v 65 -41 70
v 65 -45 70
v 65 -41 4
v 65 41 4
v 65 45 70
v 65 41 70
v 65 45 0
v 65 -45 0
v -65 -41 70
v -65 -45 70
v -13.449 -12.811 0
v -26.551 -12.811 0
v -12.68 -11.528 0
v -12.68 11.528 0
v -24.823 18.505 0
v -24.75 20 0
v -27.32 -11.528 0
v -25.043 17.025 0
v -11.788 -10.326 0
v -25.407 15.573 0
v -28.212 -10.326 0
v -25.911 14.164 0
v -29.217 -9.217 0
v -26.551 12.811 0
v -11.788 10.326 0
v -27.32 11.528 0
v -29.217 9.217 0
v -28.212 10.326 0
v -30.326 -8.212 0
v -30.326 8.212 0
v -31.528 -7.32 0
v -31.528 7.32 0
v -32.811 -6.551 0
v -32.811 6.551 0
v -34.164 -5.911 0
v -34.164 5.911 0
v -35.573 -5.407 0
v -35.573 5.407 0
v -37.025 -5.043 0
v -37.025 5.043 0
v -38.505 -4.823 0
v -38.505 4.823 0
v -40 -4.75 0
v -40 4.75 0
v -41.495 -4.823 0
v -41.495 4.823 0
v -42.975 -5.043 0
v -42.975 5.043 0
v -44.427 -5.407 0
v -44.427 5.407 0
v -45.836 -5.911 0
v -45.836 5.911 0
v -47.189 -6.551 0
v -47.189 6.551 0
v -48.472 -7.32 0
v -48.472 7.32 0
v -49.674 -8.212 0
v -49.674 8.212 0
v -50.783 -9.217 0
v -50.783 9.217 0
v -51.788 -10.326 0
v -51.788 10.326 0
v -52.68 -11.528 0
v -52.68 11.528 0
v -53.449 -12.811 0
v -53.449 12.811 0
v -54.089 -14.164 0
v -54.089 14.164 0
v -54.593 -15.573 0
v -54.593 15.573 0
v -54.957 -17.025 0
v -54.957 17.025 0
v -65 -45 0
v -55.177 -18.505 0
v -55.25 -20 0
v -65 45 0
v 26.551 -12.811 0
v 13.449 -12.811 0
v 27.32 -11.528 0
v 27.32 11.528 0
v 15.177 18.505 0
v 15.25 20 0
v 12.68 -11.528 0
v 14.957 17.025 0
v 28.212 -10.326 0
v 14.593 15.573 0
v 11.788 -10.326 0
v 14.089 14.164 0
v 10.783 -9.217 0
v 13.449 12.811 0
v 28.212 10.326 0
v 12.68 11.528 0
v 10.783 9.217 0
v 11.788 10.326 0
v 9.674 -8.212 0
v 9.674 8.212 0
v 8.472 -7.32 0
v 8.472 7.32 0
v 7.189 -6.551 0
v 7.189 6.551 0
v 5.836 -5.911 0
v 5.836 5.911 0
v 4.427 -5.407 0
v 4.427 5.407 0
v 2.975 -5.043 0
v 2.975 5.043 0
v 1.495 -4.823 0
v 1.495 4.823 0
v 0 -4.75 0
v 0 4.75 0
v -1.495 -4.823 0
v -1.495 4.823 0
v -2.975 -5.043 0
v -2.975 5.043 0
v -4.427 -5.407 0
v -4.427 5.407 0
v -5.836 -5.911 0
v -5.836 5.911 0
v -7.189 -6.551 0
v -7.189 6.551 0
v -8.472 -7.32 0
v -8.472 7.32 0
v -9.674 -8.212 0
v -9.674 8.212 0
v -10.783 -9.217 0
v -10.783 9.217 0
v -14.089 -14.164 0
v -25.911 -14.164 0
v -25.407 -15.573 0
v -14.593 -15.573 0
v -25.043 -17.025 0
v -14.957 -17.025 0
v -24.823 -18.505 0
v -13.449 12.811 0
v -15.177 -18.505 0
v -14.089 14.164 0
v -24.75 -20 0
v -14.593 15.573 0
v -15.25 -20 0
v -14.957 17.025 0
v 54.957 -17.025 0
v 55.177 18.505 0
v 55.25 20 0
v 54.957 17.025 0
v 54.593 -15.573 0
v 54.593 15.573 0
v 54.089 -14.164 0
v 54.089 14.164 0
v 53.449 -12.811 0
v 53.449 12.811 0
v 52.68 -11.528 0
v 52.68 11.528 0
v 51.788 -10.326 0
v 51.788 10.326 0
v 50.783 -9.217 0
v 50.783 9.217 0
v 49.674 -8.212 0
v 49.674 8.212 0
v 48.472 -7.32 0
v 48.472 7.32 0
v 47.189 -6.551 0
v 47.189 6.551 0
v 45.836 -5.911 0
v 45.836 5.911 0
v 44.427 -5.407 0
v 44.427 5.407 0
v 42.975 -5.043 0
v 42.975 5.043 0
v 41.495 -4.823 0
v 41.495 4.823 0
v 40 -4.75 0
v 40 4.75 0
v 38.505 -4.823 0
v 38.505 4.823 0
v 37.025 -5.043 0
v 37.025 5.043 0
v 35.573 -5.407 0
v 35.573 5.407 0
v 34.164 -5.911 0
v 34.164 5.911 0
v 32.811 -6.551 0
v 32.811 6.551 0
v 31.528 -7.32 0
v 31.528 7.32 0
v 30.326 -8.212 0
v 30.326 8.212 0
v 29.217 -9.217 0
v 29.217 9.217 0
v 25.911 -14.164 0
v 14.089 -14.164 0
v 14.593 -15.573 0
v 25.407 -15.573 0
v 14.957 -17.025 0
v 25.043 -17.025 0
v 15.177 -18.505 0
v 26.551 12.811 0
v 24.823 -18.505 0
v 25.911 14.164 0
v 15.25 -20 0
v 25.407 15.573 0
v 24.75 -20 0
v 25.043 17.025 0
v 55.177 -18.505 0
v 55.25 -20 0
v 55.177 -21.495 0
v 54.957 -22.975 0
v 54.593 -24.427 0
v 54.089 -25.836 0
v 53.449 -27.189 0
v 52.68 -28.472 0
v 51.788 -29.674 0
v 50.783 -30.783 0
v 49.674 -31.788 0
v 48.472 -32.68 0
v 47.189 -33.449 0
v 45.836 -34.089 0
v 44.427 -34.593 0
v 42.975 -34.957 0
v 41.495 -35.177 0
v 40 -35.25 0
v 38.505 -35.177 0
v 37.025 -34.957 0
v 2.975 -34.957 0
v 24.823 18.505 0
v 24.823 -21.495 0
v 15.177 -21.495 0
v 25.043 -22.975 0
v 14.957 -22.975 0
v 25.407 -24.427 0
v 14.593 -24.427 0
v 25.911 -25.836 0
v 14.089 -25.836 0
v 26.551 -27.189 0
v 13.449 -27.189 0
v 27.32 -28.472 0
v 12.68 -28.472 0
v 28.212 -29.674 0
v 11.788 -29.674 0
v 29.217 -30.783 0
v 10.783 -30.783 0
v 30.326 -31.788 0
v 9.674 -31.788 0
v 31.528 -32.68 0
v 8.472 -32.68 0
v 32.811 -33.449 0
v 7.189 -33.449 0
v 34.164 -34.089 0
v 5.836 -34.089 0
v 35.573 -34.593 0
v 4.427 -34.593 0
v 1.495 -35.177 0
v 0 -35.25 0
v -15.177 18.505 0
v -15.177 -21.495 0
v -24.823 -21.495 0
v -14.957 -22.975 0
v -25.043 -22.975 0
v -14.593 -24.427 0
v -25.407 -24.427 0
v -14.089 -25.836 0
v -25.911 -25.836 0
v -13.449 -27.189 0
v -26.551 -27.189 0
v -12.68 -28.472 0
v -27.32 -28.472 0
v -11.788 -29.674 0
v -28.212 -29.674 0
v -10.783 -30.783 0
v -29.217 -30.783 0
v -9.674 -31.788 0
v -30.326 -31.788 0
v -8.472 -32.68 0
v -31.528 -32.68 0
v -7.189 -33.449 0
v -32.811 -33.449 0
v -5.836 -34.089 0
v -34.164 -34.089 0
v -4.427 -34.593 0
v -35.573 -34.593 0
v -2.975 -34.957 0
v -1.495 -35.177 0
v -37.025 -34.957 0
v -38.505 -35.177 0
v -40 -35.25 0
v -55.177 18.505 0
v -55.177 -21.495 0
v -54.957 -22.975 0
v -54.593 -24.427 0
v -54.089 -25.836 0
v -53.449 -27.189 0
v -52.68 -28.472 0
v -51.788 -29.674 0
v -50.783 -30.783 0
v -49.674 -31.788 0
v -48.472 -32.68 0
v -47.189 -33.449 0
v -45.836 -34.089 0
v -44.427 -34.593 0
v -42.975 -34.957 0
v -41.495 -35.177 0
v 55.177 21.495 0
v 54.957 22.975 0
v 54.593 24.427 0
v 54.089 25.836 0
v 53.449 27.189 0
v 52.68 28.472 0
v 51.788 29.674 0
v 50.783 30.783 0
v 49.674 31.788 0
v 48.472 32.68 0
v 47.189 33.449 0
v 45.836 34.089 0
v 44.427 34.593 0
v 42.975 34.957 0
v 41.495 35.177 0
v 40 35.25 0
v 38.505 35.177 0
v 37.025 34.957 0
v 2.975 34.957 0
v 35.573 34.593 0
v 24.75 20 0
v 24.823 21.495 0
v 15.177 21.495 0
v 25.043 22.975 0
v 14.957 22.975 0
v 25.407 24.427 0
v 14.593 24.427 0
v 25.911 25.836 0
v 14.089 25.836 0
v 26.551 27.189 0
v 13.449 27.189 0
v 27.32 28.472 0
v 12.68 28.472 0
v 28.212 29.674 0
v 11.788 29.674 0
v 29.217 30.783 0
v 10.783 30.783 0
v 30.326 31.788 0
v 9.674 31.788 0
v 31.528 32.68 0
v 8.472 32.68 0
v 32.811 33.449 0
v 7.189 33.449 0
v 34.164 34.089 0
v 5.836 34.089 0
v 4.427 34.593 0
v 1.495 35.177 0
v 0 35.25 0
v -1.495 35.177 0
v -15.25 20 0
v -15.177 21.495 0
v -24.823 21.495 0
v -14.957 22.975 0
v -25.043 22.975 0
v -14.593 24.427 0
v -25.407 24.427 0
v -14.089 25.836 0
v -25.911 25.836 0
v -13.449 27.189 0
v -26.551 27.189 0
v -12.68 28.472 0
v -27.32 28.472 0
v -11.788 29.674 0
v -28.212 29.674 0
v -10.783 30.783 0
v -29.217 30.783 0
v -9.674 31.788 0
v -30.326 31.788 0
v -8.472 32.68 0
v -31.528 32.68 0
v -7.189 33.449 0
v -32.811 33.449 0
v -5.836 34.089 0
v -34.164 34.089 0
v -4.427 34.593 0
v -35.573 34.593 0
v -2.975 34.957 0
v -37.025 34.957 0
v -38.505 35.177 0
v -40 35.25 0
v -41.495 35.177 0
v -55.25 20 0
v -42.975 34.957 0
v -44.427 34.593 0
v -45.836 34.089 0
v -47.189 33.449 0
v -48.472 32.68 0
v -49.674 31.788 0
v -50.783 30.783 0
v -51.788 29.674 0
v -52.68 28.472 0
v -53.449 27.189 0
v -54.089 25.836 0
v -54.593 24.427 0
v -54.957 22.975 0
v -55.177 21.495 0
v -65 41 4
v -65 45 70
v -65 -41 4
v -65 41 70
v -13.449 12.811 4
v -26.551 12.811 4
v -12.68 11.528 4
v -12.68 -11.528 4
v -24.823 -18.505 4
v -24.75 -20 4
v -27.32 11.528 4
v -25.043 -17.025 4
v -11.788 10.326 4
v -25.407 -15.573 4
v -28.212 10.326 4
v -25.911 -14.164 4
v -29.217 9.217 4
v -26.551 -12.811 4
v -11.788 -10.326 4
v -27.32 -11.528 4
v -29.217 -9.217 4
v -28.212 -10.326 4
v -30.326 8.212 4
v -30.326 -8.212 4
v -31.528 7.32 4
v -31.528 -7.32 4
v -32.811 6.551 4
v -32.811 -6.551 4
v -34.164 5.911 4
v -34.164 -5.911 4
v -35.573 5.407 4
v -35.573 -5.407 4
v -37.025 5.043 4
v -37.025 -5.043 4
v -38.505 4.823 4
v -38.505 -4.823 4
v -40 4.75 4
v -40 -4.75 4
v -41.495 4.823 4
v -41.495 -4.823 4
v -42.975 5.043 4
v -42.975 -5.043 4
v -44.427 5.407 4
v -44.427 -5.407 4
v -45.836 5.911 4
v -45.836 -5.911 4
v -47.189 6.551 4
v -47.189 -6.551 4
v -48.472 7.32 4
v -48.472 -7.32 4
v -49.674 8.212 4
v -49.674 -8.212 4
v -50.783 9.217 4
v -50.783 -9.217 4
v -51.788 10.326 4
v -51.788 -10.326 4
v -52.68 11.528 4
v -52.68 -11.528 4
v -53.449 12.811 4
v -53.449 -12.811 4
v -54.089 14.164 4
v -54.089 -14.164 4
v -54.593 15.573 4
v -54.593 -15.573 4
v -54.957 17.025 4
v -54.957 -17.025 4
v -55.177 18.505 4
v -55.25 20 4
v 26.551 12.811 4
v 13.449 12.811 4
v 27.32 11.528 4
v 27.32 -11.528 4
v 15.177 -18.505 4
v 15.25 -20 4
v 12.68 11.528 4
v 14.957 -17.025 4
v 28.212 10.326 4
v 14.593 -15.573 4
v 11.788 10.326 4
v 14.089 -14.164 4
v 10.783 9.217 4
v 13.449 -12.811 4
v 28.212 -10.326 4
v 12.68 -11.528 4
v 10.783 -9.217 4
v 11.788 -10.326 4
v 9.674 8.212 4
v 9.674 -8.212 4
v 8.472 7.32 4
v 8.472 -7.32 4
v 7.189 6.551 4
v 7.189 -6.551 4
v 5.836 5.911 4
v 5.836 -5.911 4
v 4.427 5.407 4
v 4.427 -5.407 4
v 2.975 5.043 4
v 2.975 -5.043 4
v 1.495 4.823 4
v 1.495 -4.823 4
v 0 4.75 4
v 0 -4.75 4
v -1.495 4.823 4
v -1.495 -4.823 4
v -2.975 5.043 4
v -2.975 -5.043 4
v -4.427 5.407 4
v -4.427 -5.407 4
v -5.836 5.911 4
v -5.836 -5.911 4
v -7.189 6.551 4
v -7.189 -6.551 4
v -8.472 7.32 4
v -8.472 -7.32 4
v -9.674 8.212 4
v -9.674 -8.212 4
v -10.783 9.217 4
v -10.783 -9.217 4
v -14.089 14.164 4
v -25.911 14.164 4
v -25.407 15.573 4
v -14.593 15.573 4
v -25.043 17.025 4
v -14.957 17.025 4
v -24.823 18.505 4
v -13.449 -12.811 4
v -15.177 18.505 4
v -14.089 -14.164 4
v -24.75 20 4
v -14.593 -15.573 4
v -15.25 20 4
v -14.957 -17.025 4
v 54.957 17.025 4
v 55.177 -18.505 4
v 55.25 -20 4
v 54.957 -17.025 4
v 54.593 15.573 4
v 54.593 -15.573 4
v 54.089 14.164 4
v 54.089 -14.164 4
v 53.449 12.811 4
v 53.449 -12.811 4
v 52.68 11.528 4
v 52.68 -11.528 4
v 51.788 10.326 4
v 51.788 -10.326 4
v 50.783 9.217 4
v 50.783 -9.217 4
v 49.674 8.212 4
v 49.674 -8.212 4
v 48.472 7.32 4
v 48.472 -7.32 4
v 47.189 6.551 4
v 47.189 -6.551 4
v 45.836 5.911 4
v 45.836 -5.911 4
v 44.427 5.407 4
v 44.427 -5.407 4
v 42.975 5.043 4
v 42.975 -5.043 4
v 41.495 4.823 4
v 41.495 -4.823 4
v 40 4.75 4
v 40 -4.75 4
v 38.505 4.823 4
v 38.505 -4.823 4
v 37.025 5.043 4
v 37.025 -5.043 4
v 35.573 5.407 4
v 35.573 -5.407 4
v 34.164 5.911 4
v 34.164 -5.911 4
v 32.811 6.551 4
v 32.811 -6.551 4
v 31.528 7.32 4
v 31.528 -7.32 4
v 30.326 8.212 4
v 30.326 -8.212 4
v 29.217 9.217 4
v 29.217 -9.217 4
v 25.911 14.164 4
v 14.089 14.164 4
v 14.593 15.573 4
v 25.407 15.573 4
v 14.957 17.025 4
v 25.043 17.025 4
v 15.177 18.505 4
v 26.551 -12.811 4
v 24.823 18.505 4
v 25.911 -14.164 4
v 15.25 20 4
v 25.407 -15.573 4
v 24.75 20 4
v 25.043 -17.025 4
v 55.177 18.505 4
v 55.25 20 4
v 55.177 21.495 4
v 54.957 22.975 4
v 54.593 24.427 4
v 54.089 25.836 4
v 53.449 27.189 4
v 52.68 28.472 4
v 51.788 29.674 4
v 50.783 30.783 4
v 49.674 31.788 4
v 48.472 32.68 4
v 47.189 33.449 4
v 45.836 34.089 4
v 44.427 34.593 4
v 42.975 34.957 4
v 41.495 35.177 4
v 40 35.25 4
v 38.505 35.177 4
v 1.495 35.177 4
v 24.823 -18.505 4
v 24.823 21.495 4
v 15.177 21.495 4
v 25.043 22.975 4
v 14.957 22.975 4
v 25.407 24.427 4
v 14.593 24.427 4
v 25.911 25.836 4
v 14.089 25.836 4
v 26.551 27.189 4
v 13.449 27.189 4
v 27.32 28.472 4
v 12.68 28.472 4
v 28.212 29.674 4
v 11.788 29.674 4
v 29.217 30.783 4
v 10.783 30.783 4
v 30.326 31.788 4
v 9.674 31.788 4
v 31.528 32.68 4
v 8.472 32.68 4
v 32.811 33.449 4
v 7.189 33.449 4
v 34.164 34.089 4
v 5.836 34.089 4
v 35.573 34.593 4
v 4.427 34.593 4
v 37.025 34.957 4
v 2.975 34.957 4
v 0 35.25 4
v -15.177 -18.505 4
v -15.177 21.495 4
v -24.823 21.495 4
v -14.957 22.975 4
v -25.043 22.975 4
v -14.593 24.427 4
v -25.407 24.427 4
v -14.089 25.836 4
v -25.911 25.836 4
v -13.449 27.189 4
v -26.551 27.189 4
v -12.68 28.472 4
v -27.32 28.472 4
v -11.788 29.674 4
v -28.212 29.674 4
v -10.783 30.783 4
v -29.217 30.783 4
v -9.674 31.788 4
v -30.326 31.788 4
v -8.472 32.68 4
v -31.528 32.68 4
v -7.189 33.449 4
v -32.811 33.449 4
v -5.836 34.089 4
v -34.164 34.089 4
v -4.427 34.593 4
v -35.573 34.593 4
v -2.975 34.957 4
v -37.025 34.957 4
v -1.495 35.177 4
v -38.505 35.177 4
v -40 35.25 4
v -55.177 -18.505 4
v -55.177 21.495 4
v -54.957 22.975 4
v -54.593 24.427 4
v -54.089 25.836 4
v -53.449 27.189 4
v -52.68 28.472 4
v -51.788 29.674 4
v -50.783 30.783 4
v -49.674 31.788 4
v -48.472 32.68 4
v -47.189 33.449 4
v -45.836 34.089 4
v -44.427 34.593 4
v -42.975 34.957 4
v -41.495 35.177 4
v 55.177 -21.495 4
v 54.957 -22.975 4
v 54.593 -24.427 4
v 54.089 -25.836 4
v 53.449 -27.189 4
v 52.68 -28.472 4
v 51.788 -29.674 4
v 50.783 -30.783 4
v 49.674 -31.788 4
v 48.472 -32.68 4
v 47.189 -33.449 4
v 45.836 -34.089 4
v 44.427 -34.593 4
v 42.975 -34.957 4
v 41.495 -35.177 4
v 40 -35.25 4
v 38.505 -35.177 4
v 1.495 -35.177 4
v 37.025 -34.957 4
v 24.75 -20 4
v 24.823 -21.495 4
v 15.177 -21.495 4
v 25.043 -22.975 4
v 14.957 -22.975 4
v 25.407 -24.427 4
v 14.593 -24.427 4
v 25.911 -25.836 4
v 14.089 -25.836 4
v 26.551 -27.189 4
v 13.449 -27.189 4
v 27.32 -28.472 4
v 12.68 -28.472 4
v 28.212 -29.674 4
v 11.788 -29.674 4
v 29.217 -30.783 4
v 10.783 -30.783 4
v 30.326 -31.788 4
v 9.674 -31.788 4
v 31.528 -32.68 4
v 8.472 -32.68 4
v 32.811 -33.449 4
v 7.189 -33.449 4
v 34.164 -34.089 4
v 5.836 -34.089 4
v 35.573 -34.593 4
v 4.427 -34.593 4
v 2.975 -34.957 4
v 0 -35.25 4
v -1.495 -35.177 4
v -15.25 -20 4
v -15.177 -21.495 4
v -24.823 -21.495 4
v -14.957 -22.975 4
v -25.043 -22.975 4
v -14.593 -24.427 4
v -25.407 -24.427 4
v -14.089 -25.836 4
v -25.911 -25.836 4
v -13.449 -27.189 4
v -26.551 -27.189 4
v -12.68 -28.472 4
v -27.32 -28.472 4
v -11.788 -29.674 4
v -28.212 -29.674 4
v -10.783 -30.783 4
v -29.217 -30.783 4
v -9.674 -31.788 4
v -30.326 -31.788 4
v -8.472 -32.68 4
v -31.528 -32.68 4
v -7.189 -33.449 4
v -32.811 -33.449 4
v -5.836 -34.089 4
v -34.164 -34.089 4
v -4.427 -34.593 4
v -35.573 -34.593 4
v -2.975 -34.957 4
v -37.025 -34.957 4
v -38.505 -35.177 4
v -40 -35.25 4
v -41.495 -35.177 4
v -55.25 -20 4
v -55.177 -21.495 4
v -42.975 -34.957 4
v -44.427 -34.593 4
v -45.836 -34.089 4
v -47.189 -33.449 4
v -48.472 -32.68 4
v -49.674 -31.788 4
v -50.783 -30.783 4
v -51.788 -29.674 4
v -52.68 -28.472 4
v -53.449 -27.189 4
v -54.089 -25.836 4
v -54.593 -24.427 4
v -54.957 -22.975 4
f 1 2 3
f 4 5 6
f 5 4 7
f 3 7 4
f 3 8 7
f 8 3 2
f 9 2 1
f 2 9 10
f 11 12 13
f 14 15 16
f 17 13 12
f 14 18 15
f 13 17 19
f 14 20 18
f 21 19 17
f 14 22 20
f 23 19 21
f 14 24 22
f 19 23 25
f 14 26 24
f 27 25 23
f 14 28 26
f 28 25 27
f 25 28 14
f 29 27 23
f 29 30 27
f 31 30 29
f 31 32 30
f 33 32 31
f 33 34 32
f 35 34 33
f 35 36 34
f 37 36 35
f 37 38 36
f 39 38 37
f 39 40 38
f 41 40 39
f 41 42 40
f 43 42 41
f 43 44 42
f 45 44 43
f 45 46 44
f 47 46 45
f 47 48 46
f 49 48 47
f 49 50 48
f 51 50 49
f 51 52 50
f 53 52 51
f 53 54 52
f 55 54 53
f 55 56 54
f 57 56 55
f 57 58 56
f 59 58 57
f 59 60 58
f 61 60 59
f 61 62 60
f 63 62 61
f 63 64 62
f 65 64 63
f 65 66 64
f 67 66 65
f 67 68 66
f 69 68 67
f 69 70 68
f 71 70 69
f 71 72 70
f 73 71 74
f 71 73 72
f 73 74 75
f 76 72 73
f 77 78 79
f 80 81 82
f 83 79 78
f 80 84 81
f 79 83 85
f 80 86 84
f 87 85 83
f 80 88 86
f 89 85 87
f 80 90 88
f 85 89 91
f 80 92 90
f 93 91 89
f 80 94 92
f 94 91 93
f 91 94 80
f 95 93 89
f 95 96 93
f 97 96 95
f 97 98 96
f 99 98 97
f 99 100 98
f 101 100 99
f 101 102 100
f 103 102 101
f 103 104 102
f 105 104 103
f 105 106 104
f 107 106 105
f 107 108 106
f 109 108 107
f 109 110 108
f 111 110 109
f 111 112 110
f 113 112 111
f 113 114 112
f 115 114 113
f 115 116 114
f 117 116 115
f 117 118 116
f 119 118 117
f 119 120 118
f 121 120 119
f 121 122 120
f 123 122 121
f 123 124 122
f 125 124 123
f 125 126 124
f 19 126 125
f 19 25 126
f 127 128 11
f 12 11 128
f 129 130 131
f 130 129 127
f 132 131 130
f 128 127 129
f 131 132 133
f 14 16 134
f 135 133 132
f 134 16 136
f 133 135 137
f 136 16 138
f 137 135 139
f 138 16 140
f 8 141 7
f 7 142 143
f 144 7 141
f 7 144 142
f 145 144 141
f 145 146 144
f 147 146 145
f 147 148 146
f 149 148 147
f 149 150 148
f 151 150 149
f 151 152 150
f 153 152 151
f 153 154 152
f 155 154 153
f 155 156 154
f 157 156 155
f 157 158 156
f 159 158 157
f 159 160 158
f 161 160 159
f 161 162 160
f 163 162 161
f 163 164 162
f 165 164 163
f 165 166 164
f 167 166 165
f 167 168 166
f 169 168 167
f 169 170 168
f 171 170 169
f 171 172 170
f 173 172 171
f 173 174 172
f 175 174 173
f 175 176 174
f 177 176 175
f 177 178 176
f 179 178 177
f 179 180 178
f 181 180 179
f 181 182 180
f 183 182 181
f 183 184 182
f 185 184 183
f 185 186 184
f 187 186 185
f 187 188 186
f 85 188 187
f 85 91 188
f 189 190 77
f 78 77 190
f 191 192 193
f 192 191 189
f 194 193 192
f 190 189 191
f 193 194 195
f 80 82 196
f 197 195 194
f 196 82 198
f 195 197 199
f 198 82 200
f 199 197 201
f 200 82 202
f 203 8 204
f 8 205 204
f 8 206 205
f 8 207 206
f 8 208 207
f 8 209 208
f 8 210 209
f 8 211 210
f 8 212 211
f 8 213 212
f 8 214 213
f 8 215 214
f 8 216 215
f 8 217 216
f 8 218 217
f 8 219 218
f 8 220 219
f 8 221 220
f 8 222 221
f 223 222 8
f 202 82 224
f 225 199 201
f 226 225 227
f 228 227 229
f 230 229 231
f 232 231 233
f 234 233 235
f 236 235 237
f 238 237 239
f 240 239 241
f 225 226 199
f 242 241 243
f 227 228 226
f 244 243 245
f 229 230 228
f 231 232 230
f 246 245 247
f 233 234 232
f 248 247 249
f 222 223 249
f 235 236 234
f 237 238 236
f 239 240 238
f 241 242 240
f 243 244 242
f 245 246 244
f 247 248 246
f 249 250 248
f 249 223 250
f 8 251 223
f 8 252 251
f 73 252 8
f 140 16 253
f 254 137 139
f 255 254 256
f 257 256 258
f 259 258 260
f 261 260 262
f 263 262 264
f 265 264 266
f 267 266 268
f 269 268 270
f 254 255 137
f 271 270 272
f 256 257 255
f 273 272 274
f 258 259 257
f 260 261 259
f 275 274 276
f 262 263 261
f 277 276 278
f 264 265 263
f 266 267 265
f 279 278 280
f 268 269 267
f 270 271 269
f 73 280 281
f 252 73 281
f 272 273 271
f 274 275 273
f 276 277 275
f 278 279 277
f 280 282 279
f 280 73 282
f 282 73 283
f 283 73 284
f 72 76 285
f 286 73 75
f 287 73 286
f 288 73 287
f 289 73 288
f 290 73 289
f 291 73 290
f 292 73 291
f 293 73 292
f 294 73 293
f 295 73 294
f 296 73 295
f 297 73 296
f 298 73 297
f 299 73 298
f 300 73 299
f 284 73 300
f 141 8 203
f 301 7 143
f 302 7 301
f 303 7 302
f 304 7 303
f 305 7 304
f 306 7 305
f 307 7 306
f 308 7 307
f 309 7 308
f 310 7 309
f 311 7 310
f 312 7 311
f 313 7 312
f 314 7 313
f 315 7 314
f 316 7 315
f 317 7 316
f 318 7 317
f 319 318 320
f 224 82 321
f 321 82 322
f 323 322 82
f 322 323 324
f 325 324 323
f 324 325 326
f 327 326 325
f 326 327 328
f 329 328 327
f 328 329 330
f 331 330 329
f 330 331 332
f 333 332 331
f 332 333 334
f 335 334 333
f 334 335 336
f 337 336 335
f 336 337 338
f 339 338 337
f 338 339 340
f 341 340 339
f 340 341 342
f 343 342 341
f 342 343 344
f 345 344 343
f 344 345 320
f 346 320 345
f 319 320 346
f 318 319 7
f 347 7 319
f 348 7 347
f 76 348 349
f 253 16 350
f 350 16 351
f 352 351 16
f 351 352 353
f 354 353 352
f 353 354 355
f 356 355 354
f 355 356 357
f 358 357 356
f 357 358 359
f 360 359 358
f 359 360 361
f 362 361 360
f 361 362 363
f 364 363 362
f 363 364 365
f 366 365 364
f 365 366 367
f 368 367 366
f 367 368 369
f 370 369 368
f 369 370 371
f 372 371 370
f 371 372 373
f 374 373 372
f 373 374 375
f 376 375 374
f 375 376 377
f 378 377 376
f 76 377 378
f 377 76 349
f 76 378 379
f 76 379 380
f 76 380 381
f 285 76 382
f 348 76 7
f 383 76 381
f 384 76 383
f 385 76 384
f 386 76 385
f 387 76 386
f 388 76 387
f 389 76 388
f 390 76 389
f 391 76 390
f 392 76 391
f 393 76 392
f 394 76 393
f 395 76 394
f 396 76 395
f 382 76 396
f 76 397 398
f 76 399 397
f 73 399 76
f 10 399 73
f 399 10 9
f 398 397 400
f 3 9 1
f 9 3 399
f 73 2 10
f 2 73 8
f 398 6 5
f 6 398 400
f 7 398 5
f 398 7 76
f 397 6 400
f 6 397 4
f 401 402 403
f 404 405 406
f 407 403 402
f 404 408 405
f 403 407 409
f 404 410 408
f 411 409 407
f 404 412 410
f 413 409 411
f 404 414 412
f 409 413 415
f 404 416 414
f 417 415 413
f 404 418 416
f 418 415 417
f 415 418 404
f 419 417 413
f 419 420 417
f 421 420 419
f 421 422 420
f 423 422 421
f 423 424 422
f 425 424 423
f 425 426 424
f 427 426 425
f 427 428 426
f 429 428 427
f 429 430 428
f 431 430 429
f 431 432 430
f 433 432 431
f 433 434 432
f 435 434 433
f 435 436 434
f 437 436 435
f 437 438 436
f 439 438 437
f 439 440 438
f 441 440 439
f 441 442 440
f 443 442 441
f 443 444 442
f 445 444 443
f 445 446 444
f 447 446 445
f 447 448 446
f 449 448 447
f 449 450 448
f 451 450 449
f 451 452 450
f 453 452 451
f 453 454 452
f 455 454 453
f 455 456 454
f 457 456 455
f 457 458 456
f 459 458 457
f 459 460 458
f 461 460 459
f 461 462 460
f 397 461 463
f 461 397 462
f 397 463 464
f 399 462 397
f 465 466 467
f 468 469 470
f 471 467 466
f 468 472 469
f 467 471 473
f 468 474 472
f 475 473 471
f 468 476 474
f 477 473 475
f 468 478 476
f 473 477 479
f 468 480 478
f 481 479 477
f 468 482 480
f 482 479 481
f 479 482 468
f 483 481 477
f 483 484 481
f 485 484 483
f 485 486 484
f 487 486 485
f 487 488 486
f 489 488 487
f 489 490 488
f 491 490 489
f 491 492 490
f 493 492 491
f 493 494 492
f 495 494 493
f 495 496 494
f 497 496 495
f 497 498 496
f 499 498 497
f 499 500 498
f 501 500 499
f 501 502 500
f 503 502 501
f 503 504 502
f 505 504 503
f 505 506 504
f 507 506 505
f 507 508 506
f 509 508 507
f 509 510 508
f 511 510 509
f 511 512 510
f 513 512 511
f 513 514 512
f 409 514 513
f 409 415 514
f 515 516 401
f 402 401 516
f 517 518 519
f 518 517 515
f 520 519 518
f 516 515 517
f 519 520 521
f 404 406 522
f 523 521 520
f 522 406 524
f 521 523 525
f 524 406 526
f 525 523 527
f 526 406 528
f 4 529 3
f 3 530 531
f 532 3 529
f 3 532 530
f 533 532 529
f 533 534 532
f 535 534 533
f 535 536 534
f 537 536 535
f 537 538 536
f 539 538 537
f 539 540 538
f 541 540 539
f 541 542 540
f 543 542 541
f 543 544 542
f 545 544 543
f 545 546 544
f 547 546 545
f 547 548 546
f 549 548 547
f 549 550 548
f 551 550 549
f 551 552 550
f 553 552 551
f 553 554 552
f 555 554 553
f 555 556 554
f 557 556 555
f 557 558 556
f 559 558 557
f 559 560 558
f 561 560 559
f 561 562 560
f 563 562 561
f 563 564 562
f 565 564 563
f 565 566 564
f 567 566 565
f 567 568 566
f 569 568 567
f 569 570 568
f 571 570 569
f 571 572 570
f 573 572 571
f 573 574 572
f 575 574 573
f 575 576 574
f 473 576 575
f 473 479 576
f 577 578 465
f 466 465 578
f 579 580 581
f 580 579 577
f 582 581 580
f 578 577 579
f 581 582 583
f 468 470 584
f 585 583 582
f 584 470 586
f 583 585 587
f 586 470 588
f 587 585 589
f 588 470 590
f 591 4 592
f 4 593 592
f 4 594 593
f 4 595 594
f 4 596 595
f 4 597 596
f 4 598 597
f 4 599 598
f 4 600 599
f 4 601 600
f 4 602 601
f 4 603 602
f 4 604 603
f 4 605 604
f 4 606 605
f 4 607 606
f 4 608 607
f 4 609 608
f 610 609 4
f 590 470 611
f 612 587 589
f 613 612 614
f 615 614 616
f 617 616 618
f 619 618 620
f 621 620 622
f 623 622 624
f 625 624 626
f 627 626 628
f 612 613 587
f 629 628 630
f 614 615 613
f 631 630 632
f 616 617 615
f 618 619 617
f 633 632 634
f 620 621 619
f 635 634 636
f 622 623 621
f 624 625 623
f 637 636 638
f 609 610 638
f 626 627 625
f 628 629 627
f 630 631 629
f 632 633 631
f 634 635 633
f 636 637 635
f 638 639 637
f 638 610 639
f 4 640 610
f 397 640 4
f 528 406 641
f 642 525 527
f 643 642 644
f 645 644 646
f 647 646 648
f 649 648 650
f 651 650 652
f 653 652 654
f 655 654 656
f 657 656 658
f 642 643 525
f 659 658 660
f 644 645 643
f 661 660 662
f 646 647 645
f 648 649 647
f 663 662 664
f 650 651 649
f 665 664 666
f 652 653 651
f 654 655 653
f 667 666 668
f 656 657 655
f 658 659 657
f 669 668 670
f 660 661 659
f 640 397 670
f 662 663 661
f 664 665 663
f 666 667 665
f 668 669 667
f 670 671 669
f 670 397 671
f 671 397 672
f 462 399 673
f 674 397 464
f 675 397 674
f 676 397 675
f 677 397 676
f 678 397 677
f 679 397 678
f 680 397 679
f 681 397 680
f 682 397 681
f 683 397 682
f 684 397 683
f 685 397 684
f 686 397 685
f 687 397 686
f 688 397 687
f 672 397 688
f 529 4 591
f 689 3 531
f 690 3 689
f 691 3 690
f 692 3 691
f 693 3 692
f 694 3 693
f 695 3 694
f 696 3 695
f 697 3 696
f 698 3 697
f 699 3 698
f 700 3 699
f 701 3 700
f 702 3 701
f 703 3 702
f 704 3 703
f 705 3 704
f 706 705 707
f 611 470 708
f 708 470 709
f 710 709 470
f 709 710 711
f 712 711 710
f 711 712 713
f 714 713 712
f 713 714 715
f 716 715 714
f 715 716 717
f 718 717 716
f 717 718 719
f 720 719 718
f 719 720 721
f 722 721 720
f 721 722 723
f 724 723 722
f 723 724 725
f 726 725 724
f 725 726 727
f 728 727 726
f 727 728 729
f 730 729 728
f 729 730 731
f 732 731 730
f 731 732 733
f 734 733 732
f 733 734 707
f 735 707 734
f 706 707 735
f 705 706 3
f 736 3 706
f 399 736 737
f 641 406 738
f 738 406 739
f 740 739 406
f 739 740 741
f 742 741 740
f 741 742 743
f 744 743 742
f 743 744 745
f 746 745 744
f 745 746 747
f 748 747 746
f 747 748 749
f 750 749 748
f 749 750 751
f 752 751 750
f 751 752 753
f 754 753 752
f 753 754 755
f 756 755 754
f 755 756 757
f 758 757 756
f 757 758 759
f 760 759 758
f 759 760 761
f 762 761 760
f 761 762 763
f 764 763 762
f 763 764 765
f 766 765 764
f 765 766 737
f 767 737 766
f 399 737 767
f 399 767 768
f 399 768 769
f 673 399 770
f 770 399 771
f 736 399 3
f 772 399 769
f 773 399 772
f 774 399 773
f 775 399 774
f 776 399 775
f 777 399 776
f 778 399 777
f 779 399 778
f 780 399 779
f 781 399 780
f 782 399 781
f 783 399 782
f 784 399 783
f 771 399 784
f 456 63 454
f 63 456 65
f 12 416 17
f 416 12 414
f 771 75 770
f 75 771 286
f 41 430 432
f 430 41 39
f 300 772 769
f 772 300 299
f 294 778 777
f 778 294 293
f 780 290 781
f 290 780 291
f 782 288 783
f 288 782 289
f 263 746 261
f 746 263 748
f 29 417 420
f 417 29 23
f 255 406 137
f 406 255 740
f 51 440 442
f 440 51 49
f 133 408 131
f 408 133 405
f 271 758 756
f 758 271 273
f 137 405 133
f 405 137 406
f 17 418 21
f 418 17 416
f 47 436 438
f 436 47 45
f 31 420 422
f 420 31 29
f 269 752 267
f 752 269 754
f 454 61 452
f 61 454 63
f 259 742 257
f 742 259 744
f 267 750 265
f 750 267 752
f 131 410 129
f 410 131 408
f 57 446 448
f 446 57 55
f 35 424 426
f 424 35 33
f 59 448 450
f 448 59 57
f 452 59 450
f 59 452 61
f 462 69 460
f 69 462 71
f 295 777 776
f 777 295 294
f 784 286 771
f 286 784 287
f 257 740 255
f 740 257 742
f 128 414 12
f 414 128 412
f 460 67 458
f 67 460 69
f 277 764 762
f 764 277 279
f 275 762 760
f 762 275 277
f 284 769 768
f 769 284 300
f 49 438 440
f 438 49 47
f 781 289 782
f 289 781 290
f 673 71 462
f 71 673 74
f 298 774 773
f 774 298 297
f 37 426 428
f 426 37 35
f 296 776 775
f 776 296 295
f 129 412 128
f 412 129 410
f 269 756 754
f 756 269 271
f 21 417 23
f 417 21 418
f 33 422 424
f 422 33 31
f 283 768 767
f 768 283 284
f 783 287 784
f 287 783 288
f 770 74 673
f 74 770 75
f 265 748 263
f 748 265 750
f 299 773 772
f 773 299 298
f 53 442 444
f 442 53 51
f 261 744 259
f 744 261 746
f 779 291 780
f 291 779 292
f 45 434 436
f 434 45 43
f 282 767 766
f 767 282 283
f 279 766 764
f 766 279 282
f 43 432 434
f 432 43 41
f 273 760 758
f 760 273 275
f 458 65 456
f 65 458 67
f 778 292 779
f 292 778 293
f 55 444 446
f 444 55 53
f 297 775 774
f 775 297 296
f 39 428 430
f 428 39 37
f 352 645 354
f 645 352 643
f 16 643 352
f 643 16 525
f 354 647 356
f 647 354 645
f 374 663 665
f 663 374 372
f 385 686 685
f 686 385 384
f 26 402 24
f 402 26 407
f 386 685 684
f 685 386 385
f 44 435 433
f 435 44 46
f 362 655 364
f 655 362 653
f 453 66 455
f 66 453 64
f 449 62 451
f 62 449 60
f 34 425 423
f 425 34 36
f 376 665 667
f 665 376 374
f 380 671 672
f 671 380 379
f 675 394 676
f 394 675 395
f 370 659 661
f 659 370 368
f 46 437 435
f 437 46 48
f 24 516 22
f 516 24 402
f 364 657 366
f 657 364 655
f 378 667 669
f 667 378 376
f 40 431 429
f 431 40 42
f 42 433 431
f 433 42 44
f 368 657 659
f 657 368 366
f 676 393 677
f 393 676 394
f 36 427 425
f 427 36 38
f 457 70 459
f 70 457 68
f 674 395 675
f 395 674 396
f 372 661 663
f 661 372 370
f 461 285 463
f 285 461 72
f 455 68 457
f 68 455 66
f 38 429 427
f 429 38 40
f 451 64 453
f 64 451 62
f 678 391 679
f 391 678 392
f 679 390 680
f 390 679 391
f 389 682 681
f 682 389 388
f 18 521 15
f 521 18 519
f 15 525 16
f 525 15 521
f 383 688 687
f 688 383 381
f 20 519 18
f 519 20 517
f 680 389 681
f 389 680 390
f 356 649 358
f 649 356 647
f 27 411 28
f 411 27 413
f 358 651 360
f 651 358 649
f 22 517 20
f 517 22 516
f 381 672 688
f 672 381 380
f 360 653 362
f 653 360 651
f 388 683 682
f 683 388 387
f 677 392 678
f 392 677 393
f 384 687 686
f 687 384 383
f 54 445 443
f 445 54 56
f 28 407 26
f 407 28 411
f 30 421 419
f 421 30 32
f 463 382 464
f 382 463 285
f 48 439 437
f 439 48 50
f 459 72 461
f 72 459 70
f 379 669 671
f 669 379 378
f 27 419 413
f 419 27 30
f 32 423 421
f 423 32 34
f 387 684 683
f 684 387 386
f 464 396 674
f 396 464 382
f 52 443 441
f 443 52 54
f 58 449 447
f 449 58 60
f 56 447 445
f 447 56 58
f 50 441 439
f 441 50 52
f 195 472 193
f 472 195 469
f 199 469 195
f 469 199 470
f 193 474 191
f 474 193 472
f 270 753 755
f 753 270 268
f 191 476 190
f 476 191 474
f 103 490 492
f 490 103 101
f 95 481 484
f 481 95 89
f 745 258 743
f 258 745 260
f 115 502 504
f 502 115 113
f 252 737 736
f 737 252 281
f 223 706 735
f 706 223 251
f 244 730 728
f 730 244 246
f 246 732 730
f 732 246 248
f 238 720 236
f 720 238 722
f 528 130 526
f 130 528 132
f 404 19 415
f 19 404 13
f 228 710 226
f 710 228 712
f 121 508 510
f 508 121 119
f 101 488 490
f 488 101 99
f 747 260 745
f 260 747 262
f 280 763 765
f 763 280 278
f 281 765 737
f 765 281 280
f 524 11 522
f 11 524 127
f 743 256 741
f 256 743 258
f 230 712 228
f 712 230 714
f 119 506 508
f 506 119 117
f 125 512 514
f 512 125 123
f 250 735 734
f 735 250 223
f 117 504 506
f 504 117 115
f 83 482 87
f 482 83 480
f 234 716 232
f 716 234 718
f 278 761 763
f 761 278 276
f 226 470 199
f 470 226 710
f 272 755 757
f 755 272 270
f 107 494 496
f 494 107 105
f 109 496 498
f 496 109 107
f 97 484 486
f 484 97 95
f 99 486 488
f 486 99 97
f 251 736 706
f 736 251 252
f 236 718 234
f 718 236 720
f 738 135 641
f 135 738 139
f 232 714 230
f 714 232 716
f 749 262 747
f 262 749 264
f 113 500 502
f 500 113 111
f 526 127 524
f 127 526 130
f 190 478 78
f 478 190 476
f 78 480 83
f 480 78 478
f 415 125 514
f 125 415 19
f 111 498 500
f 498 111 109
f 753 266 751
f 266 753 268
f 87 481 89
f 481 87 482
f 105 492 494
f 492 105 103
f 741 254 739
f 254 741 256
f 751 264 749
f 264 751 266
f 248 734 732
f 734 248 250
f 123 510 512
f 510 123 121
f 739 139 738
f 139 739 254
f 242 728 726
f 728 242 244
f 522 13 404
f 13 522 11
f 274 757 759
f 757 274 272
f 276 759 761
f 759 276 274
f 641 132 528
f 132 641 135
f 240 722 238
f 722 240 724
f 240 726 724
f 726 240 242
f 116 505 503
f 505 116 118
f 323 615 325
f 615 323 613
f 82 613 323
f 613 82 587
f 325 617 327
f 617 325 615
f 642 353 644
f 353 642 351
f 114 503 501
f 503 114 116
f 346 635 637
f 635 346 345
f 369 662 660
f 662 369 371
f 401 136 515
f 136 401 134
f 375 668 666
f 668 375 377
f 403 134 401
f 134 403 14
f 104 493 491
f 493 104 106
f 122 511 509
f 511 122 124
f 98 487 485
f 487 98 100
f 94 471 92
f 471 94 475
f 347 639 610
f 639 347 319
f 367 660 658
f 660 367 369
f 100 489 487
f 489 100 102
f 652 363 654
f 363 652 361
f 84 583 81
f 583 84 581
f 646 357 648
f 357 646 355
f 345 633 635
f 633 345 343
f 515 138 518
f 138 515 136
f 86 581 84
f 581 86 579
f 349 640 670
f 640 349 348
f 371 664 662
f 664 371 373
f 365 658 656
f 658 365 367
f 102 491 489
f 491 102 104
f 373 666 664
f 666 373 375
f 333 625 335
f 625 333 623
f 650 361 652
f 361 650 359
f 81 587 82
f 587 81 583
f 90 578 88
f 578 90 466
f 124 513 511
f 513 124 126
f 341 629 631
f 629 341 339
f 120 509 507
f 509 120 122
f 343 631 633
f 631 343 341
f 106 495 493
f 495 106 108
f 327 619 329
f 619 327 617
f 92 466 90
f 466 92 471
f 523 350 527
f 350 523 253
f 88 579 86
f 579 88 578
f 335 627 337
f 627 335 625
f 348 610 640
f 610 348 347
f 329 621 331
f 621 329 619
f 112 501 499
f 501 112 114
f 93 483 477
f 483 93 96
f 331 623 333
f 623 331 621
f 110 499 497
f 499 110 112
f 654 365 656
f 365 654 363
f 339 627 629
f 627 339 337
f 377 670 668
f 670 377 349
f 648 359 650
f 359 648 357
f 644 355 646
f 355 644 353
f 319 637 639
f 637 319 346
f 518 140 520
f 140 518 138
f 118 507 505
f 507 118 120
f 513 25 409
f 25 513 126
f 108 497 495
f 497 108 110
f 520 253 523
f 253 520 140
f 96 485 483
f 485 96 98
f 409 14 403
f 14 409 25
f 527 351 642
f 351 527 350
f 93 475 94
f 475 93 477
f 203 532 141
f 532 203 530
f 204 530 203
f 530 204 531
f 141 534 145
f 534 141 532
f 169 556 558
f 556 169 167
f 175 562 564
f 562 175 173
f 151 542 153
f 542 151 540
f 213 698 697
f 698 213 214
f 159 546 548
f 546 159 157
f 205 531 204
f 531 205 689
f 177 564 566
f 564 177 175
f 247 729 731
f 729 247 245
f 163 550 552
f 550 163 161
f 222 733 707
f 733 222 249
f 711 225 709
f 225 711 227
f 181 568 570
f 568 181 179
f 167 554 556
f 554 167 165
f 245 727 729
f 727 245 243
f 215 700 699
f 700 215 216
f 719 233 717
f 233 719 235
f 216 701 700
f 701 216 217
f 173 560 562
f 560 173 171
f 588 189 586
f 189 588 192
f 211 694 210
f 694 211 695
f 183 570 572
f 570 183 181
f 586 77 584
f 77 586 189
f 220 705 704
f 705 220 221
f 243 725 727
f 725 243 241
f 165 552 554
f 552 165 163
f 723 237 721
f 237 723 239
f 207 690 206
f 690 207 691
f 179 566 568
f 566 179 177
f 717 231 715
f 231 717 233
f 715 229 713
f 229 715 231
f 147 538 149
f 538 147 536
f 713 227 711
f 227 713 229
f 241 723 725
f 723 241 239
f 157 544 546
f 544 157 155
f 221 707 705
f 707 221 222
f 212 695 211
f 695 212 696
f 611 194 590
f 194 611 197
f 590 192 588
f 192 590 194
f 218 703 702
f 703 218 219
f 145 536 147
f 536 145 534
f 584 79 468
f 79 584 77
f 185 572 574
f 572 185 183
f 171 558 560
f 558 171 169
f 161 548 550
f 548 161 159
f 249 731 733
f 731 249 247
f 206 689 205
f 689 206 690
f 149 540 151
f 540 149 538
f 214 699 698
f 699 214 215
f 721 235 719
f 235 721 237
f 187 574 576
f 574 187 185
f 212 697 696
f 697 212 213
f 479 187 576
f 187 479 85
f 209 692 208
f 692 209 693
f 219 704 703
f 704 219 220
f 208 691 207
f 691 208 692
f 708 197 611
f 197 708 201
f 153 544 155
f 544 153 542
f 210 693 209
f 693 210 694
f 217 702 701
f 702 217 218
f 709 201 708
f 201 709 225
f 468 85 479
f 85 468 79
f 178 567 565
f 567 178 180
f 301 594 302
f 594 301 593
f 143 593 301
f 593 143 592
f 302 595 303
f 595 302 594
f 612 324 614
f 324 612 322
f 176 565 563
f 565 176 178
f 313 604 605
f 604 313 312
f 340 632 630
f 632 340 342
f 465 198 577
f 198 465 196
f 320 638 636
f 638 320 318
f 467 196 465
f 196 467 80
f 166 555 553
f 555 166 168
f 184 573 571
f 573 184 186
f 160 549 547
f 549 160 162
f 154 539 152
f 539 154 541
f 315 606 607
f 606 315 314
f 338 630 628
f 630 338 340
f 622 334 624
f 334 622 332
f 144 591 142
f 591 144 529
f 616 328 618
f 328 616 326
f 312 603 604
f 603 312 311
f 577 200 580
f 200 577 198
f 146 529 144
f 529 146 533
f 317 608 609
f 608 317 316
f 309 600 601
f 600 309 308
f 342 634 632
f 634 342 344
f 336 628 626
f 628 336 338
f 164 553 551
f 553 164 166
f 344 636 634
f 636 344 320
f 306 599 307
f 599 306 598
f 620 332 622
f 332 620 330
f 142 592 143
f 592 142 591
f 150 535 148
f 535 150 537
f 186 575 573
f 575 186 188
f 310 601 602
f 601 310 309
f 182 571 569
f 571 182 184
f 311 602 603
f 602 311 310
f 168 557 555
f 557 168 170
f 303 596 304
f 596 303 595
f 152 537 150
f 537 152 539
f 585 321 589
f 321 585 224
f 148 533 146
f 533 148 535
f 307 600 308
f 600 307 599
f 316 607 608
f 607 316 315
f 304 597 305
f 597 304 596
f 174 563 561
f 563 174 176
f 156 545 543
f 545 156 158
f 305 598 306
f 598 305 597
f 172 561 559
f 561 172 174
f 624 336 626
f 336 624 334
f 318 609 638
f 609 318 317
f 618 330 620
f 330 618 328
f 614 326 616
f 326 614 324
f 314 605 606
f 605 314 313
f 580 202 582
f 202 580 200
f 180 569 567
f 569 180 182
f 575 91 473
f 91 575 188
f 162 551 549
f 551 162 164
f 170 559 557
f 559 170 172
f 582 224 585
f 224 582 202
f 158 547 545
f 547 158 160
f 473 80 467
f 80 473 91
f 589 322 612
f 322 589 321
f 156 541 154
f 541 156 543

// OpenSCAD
// Rack for six 50 mL conical tubes (print orientation, upside down)

$fn = 64;

plate_x = 130;      // plate length (X)
plate_y = 90;       // plate width (Y)
plate_t = 4;        // plate thickness (Z)

hole_d = 30.5;      // tube hole diameter
hole_pitch = 40;    // centre-to-centre spacing in X and Y
n_x = 3;            // holes along X
n_y = 2;            // holes along Y

wall_len = 130;     // wall length (X)
wall_t = 4;         // wall thickness (Y)
wall_h = 70;        // wall top height (Z)

cut_ext = 0.5;      // cutter overshoot

difference() {
    union() {
        // base plate
        translate([-plate_x/2, -plate_y/2, 0])
            cube([plate_x, plate_y, plate_t]);
        // two long walls, flush with long edges
        for (s = [-1, 1])
            translate([-wall_len/2, s > 0 ? plate_y/2 - wall_t : -plate_y/2, 0])
                cube([wall_len, wall_t, wall_h]);
    }
    // tube holes
    for (i = [0 : n_x - 1])
        for (j = [0 : n_y - 1])
            translate([(i - (n_x - 1)/2) * hole_pitch,
                       (j - (n_y - 1)/2) * hole_pitch,
                       -cut_ext])
                cylinder(d = hole_d, h = plate_t + 2*cut_ext);
}
